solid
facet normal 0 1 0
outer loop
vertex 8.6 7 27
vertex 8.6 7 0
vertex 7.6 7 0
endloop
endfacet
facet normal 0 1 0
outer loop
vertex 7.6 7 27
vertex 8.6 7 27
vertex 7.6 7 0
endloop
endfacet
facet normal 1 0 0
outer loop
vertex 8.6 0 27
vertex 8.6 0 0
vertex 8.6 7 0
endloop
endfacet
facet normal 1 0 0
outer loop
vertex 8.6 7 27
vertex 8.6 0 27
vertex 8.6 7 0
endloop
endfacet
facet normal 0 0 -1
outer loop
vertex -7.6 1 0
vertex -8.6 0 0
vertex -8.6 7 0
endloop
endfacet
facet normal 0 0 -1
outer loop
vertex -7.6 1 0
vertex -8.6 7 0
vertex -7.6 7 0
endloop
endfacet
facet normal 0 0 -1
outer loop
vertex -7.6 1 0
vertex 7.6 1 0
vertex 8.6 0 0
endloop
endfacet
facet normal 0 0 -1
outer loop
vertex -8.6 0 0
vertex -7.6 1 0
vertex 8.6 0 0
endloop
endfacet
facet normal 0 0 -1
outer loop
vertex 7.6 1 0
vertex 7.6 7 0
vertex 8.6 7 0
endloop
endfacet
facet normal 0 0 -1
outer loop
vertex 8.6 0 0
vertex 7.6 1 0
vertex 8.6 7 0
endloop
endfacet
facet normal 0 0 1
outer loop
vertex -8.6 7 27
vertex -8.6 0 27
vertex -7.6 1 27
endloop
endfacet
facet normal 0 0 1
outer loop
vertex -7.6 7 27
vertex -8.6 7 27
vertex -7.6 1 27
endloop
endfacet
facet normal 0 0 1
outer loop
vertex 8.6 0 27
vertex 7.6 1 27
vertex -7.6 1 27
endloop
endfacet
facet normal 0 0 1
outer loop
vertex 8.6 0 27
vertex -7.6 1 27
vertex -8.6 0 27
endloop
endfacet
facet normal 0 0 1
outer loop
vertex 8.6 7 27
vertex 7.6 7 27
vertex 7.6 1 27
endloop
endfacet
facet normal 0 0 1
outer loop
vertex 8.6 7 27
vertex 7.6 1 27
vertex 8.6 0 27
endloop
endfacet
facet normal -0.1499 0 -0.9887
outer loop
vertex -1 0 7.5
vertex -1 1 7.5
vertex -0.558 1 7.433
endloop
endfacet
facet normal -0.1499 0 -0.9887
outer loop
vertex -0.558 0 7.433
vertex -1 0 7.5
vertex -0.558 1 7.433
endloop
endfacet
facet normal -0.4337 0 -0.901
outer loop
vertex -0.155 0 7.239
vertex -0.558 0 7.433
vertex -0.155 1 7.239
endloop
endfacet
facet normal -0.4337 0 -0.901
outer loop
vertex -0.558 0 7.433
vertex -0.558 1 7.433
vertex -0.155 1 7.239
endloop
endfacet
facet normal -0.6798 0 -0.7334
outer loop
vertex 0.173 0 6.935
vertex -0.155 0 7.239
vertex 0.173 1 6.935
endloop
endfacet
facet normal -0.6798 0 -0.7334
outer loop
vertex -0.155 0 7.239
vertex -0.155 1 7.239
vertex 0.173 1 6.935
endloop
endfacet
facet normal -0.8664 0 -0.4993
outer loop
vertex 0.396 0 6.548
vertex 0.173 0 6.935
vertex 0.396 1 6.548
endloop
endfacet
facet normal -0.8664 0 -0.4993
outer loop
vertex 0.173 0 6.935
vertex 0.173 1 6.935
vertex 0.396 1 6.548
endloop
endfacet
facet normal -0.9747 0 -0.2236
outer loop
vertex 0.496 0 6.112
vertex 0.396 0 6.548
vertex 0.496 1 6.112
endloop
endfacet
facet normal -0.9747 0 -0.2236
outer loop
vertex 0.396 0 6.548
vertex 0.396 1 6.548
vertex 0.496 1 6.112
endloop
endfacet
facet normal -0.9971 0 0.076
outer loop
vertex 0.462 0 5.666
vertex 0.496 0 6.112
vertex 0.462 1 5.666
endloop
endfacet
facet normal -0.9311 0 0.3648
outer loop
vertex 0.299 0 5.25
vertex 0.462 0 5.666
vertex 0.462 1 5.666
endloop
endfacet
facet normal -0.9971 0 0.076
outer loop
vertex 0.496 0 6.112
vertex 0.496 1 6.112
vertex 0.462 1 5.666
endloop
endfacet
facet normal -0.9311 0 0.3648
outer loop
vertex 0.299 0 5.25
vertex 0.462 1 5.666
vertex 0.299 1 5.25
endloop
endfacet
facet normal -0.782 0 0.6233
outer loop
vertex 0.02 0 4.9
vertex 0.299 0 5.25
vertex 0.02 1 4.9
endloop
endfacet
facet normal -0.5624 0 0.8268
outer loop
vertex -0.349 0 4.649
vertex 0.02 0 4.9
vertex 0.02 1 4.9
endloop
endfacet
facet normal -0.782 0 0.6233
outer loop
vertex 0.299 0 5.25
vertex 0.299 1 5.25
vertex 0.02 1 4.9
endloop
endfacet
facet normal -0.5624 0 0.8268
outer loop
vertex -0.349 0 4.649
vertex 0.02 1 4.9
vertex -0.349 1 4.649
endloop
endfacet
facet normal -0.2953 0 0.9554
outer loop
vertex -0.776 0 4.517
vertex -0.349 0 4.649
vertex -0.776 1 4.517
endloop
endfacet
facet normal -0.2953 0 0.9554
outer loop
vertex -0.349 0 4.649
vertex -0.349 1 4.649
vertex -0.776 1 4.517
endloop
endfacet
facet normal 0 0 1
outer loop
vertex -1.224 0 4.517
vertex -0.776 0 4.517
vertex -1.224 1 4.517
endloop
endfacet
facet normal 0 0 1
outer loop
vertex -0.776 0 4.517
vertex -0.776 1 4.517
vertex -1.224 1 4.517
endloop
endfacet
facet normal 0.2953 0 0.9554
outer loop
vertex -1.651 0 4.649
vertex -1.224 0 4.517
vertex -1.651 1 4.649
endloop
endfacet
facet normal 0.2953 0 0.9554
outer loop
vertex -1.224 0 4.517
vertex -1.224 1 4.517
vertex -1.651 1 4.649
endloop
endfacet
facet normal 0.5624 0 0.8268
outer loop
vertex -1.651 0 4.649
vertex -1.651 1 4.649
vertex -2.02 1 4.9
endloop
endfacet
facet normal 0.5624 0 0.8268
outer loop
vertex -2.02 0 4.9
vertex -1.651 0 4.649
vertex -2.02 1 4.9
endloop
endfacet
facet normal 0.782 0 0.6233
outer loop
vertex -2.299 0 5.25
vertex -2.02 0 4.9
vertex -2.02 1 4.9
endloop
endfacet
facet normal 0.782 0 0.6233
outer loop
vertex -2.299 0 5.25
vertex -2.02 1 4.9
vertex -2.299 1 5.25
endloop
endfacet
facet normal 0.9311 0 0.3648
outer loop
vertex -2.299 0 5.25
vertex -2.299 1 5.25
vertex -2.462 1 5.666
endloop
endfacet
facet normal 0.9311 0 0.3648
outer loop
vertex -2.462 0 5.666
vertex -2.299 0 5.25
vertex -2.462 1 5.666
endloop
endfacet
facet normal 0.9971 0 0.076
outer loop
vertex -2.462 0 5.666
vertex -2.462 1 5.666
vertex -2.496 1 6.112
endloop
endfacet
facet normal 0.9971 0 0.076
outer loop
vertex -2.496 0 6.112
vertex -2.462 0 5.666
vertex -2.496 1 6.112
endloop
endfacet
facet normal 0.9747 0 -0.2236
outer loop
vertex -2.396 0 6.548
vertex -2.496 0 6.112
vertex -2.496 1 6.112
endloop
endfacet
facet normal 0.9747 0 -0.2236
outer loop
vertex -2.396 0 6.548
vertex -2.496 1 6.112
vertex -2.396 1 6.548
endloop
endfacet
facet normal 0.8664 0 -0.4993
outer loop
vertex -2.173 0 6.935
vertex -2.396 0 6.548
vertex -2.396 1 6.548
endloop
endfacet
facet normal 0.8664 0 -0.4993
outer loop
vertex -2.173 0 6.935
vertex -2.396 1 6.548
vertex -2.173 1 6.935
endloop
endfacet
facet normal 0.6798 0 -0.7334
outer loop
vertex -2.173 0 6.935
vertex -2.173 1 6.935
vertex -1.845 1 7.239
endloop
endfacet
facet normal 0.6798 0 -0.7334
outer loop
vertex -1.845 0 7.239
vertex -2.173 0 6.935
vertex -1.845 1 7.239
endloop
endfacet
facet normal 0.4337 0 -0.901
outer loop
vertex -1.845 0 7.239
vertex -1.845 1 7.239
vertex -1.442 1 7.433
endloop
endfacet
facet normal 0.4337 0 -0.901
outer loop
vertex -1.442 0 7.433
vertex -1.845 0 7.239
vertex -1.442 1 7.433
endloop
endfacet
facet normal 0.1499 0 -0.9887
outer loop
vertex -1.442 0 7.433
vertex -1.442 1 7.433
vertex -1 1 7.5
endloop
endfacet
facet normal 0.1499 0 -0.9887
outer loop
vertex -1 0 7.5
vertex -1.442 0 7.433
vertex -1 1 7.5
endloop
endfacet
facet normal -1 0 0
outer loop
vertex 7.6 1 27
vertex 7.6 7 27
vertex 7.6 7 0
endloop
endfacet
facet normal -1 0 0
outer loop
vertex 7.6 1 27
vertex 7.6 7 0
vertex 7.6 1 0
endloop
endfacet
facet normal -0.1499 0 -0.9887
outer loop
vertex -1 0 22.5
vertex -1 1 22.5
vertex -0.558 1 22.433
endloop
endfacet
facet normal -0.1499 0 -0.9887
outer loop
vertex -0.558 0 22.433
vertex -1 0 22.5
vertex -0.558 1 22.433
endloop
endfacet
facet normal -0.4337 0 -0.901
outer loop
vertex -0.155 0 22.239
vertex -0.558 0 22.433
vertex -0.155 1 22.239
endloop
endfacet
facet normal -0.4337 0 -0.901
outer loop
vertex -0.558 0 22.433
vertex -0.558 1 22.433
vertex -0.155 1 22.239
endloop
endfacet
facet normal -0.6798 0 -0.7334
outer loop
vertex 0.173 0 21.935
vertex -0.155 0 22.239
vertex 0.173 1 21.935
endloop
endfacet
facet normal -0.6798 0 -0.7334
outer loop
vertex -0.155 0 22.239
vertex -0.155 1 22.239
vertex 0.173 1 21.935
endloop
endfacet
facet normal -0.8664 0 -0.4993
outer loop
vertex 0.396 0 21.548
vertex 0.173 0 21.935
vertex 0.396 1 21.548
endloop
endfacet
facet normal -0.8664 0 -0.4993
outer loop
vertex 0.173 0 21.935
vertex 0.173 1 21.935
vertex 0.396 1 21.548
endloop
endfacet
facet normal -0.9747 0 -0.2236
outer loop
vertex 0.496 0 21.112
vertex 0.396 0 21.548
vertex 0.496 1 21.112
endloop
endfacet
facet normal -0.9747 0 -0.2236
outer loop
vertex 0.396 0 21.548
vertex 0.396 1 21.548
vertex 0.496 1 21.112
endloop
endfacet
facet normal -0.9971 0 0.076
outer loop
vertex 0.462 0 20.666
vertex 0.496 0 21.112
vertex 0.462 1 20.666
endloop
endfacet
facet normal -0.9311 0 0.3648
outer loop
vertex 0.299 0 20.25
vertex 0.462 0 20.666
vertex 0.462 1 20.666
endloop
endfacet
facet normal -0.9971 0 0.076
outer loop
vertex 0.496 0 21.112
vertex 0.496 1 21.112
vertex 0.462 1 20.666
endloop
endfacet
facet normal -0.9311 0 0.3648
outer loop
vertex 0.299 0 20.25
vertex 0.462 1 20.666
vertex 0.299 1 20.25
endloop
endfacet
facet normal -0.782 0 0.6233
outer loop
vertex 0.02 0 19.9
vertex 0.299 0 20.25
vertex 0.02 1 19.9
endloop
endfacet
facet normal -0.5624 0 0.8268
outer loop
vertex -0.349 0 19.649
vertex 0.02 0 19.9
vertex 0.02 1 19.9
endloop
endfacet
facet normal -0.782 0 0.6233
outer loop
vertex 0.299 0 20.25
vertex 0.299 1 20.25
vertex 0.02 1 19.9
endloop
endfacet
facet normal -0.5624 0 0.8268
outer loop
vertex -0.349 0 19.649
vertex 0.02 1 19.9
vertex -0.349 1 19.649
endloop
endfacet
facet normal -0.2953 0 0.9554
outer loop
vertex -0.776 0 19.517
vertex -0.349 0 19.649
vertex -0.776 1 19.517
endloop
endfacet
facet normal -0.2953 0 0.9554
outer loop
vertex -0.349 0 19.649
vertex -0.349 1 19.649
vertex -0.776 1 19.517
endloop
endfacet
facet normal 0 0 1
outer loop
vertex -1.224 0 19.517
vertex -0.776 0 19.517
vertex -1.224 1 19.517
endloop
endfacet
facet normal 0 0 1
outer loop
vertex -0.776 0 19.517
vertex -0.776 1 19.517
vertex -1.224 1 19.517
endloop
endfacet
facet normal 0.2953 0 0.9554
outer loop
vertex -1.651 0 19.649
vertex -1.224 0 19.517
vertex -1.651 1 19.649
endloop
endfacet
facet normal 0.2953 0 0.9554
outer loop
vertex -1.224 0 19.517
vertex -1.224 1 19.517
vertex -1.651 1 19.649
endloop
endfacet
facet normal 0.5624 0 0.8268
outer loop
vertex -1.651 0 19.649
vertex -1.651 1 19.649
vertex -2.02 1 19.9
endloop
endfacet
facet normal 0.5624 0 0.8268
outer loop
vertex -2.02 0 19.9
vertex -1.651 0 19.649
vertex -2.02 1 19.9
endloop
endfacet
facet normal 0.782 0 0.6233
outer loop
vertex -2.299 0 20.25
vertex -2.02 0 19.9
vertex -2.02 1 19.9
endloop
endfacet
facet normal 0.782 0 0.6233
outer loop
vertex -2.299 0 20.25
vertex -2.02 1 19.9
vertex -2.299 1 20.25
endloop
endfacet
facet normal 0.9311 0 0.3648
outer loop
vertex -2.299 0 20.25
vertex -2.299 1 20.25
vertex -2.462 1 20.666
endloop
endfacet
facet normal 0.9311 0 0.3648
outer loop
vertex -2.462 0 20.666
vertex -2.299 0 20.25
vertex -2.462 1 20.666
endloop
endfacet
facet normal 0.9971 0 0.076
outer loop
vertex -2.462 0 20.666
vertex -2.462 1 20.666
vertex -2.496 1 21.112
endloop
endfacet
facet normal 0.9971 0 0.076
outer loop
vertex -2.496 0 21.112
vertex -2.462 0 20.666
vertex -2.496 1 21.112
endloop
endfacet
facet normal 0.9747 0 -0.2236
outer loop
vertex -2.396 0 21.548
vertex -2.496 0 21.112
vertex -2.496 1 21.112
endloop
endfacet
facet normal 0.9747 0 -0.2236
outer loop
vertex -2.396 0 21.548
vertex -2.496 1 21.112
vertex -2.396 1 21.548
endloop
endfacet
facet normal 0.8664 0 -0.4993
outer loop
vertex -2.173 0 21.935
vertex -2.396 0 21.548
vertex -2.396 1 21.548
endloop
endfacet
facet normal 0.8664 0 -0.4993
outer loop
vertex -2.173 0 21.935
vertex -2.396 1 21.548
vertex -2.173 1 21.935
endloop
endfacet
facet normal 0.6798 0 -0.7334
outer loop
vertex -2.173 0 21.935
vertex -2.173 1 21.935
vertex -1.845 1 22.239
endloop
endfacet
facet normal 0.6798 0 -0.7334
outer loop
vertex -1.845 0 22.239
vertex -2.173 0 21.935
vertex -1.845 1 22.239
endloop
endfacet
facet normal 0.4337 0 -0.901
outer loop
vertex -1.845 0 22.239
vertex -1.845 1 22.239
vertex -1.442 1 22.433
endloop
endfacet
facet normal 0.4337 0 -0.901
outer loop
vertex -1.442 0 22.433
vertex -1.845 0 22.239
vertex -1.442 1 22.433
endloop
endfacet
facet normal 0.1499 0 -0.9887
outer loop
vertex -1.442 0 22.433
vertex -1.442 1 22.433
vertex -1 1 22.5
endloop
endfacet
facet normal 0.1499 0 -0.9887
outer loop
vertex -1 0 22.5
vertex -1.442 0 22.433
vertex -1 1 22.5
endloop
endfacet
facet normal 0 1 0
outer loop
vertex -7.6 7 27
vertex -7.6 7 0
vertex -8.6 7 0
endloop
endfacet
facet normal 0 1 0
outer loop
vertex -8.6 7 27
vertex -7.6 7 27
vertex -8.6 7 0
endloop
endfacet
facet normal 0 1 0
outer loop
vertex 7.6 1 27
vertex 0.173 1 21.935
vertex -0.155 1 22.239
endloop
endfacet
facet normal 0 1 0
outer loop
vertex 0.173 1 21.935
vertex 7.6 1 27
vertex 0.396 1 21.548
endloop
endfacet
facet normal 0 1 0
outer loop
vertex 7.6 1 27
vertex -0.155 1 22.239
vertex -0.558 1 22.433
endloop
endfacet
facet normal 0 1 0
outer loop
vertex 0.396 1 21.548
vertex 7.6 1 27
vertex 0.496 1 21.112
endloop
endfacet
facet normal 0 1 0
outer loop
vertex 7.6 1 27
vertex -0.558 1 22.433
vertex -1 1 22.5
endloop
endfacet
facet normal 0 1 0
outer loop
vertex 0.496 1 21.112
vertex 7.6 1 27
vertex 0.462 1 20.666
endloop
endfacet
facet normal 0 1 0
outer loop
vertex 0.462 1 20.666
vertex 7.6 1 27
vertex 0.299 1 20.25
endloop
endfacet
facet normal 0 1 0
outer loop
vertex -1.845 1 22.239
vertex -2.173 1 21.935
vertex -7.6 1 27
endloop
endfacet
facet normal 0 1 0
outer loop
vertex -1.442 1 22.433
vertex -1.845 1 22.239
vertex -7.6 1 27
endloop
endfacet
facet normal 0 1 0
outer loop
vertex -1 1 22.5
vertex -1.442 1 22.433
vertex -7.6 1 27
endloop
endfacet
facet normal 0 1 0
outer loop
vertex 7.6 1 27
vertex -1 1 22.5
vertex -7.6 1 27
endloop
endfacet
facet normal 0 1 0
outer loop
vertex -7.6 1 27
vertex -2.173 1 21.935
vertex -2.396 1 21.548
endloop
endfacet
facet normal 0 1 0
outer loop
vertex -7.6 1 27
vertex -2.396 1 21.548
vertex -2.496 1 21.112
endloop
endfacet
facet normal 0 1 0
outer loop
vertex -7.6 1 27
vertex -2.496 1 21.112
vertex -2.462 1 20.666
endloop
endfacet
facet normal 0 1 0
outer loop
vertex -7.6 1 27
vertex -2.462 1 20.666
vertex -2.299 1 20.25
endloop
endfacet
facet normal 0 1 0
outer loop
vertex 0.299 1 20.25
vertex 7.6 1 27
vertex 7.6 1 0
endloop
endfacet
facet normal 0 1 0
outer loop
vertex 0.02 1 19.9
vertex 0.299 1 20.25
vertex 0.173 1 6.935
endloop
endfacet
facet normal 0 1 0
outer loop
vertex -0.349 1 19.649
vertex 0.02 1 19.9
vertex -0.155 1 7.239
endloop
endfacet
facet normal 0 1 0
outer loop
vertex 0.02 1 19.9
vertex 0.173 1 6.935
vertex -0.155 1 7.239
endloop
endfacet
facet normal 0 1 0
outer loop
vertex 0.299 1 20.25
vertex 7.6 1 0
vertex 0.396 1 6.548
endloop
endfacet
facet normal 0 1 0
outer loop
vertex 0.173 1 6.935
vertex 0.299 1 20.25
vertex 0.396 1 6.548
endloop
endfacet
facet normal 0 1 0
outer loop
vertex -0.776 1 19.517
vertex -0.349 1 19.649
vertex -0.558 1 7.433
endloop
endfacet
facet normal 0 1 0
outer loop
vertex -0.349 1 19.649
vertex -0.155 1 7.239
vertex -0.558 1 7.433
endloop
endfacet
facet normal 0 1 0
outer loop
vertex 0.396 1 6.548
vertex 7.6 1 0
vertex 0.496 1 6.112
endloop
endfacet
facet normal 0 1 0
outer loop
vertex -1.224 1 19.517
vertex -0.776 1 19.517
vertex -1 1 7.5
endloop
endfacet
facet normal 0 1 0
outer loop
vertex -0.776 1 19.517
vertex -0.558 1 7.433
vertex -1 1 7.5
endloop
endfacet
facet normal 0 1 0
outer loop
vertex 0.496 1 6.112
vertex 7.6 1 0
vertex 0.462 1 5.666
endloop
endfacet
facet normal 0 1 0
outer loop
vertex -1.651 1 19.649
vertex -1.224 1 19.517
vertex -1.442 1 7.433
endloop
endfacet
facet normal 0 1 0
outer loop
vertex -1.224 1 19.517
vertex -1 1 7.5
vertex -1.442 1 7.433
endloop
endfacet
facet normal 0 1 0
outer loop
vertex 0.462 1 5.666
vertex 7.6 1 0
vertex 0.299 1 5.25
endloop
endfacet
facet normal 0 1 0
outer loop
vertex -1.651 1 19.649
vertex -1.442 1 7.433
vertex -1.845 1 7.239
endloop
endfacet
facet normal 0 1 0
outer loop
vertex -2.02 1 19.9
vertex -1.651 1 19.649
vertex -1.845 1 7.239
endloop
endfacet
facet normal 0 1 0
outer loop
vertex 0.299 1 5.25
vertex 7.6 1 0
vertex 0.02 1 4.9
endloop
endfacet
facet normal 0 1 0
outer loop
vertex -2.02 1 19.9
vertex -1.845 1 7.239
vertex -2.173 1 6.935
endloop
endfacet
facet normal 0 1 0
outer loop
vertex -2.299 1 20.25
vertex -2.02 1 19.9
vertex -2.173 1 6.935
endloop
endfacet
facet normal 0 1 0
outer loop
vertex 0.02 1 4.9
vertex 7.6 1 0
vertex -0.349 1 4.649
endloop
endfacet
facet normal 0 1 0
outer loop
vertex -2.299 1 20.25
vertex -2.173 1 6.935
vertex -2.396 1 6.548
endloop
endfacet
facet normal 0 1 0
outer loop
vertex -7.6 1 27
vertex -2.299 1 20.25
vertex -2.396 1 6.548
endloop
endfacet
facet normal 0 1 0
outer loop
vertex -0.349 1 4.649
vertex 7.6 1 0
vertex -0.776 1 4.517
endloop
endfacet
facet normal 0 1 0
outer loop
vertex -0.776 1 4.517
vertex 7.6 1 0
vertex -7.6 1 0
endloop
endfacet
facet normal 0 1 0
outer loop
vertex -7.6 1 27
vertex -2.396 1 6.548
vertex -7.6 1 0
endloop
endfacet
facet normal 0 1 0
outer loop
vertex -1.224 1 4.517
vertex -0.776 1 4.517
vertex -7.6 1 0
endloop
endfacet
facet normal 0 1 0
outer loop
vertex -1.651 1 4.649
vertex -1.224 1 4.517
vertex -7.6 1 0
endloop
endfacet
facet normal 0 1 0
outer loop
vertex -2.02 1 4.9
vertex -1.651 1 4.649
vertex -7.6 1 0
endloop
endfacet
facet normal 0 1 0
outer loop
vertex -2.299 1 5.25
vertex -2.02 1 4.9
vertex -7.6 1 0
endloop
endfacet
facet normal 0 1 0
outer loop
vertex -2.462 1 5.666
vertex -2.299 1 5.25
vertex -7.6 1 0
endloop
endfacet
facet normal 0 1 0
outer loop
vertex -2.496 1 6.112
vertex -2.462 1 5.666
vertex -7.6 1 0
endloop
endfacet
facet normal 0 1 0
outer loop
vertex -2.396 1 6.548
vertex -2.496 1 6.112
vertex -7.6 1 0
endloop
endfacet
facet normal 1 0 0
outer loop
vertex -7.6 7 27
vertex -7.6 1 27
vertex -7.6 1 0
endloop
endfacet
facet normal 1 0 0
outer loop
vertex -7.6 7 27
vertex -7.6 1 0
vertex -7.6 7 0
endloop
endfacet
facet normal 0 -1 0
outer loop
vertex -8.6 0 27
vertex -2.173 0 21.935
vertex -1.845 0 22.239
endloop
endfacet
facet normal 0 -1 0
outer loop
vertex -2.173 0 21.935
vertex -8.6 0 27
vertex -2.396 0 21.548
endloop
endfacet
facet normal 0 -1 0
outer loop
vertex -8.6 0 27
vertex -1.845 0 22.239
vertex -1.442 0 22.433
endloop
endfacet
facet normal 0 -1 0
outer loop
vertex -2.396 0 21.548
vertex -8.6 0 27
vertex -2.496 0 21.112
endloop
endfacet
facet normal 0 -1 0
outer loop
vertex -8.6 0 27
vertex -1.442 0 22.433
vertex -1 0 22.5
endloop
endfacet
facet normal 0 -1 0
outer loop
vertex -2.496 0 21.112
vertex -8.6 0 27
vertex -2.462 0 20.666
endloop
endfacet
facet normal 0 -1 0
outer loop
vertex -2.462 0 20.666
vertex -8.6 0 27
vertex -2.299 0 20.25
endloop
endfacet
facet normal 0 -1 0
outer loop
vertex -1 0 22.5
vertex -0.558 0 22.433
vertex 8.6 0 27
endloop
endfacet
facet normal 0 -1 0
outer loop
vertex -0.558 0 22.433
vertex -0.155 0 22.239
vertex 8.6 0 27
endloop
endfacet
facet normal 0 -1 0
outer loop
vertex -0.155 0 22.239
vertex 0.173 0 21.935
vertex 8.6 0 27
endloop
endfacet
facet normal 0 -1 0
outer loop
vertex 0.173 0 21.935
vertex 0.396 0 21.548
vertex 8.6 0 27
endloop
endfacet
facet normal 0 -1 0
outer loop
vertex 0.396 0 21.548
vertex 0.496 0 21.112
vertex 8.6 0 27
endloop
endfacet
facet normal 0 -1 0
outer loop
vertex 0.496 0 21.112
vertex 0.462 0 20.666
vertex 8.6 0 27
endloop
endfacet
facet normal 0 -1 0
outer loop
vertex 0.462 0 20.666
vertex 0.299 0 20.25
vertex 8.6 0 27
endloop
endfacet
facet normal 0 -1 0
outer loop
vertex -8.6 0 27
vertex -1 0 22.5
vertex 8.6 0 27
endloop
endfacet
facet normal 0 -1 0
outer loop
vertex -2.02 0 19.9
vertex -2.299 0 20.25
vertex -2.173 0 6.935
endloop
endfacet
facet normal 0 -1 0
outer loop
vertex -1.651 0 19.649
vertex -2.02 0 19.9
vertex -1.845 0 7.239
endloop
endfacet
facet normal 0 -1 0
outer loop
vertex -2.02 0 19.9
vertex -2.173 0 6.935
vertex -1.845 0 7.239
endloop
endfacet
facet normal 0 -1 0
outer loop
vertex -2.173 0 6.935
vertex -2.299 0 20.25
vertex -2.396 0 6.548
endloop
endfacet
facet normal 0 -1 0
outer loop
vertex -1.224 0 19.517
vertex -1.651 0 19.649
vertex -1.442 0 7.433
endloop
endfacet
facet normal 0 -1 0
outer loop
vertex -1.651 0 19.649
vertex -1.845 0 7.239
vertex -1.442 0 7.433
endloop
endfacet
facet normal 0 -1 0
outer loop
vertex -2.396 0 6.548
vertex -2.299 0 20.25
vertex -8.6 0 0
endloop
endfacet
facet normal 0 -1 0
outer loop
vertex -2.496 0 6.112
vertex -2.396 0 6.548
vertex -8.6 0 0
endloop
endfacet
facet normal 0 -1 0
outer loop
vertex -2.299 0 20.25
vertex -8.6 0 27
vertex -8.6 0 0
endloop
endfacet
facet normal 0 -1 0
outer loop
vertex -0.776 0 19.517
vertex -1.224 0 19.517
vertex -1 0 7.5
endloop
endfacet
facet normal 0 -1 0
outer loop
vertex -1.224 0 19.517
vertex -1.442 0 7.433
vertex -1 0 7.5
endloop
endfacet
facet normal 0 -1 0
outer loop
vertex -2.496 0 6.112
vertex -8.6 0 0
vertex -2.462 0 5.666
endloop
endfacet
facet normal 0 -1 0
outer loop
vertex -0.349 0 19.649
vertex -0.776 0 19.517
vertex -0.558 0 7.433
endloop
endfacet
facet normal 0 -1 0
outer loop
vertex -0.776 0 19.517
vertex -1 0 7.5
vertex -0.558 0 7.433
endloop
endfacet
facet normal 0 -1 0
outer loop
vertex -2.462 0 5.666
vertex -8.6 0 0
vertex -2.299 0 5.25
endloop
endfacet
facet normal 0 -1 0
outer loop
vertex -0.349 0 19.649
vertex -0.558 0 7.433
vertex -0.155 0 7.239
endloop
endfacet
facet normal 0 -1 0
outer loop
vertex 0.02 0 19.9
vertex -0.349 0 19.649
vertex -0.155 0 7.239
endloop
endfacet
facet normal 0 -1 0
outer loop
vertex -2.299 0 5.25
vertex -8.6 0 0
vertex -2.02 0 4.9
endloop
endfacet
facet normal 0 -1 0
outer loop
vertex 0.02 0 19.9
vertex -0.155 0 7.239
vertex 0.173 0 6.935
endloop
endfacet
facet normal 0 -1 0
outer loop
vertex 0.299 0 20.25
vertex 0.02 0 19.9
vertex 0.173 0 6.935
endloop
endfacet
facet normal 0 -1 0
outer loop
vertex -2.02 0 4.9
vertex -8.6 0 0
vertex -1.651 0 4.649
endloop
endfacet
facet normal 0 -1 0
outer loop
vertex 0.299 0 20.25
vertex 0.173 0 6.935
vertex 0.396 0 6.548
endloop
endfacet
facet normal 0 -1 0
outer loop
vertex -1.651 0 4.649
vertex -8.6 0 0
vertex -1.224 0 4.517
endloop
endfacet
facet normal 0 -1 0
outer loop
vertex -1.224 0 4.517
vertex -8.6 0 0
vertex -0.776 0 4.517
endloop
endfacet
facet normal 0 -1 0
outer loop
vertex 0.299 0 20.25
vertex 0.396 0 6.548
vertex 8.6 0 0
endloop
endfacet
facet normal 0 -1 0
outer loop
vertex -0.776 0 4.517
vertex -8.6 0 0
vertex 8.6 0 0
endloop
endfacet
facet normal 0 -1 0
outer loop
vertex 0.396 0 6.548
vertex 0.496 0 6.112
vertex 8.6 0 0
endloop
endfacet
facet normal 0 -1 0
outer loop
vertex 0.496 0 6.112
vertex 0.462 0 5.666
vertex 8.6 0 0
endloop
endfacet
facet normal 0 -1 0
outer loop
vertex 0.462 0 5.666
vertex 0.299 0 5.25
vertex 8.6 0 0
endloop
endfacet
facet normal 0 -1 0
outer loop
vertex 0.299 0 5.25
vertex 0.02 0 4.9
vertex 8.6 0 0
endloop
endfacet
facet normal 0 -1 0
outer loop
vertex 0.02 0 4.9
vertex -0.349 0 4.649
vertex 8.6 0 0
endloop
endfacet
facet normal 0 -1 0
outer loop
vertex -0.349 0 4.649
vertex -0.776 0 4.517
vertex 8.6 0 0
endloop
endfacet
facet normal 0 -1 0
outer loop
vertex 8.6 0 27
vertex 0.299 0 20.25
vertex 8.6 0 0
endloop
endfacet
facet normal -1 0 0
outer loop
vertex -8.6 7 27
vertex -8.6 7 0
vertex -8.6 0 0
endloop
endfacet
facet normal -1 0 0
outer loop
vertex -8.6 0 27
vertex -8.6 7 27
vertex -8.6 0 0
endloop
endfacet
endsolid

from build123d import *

# Parameters (mm, degrees)
EXTRUDE_641_DEPTH   = 27
SKETCH_3_R          = 1.5
CUT_EXTRUDE_1_DEPTH = 29.964806231


with BuildPart() as part:
    # Sketch 298 → Extrude 641 (new body)
    with BuildSketch(Plane.XY):
        Polygon((-7.6, 7), (-8.6, 7), (-8.6, 0), (8.6, 0), (8.6, 7), (7.6, 7), (7.6, 1), (-7.6, 1), align=None)
    extrude(amount=EXTRUDE_641_DEPTH)

    # Эскиз3 → Вырез-Вытянуть1 (cut, through all)
    with BuildSketch(Plane(origin=(0, 1, 0), x_dir=(1, 0, 0), z_dir=(0, 1, 0))):
        with Locations((-1, -6)):
            Circle(SKETCH_3_R)
        with Locations((-1, -21)):
            Circle(SKETCH_3_R)
    extrude(amount=-CUT_EXTRUDE_1_DEPTH, mode=Mode.SUBTRACT)


solid = part.part
